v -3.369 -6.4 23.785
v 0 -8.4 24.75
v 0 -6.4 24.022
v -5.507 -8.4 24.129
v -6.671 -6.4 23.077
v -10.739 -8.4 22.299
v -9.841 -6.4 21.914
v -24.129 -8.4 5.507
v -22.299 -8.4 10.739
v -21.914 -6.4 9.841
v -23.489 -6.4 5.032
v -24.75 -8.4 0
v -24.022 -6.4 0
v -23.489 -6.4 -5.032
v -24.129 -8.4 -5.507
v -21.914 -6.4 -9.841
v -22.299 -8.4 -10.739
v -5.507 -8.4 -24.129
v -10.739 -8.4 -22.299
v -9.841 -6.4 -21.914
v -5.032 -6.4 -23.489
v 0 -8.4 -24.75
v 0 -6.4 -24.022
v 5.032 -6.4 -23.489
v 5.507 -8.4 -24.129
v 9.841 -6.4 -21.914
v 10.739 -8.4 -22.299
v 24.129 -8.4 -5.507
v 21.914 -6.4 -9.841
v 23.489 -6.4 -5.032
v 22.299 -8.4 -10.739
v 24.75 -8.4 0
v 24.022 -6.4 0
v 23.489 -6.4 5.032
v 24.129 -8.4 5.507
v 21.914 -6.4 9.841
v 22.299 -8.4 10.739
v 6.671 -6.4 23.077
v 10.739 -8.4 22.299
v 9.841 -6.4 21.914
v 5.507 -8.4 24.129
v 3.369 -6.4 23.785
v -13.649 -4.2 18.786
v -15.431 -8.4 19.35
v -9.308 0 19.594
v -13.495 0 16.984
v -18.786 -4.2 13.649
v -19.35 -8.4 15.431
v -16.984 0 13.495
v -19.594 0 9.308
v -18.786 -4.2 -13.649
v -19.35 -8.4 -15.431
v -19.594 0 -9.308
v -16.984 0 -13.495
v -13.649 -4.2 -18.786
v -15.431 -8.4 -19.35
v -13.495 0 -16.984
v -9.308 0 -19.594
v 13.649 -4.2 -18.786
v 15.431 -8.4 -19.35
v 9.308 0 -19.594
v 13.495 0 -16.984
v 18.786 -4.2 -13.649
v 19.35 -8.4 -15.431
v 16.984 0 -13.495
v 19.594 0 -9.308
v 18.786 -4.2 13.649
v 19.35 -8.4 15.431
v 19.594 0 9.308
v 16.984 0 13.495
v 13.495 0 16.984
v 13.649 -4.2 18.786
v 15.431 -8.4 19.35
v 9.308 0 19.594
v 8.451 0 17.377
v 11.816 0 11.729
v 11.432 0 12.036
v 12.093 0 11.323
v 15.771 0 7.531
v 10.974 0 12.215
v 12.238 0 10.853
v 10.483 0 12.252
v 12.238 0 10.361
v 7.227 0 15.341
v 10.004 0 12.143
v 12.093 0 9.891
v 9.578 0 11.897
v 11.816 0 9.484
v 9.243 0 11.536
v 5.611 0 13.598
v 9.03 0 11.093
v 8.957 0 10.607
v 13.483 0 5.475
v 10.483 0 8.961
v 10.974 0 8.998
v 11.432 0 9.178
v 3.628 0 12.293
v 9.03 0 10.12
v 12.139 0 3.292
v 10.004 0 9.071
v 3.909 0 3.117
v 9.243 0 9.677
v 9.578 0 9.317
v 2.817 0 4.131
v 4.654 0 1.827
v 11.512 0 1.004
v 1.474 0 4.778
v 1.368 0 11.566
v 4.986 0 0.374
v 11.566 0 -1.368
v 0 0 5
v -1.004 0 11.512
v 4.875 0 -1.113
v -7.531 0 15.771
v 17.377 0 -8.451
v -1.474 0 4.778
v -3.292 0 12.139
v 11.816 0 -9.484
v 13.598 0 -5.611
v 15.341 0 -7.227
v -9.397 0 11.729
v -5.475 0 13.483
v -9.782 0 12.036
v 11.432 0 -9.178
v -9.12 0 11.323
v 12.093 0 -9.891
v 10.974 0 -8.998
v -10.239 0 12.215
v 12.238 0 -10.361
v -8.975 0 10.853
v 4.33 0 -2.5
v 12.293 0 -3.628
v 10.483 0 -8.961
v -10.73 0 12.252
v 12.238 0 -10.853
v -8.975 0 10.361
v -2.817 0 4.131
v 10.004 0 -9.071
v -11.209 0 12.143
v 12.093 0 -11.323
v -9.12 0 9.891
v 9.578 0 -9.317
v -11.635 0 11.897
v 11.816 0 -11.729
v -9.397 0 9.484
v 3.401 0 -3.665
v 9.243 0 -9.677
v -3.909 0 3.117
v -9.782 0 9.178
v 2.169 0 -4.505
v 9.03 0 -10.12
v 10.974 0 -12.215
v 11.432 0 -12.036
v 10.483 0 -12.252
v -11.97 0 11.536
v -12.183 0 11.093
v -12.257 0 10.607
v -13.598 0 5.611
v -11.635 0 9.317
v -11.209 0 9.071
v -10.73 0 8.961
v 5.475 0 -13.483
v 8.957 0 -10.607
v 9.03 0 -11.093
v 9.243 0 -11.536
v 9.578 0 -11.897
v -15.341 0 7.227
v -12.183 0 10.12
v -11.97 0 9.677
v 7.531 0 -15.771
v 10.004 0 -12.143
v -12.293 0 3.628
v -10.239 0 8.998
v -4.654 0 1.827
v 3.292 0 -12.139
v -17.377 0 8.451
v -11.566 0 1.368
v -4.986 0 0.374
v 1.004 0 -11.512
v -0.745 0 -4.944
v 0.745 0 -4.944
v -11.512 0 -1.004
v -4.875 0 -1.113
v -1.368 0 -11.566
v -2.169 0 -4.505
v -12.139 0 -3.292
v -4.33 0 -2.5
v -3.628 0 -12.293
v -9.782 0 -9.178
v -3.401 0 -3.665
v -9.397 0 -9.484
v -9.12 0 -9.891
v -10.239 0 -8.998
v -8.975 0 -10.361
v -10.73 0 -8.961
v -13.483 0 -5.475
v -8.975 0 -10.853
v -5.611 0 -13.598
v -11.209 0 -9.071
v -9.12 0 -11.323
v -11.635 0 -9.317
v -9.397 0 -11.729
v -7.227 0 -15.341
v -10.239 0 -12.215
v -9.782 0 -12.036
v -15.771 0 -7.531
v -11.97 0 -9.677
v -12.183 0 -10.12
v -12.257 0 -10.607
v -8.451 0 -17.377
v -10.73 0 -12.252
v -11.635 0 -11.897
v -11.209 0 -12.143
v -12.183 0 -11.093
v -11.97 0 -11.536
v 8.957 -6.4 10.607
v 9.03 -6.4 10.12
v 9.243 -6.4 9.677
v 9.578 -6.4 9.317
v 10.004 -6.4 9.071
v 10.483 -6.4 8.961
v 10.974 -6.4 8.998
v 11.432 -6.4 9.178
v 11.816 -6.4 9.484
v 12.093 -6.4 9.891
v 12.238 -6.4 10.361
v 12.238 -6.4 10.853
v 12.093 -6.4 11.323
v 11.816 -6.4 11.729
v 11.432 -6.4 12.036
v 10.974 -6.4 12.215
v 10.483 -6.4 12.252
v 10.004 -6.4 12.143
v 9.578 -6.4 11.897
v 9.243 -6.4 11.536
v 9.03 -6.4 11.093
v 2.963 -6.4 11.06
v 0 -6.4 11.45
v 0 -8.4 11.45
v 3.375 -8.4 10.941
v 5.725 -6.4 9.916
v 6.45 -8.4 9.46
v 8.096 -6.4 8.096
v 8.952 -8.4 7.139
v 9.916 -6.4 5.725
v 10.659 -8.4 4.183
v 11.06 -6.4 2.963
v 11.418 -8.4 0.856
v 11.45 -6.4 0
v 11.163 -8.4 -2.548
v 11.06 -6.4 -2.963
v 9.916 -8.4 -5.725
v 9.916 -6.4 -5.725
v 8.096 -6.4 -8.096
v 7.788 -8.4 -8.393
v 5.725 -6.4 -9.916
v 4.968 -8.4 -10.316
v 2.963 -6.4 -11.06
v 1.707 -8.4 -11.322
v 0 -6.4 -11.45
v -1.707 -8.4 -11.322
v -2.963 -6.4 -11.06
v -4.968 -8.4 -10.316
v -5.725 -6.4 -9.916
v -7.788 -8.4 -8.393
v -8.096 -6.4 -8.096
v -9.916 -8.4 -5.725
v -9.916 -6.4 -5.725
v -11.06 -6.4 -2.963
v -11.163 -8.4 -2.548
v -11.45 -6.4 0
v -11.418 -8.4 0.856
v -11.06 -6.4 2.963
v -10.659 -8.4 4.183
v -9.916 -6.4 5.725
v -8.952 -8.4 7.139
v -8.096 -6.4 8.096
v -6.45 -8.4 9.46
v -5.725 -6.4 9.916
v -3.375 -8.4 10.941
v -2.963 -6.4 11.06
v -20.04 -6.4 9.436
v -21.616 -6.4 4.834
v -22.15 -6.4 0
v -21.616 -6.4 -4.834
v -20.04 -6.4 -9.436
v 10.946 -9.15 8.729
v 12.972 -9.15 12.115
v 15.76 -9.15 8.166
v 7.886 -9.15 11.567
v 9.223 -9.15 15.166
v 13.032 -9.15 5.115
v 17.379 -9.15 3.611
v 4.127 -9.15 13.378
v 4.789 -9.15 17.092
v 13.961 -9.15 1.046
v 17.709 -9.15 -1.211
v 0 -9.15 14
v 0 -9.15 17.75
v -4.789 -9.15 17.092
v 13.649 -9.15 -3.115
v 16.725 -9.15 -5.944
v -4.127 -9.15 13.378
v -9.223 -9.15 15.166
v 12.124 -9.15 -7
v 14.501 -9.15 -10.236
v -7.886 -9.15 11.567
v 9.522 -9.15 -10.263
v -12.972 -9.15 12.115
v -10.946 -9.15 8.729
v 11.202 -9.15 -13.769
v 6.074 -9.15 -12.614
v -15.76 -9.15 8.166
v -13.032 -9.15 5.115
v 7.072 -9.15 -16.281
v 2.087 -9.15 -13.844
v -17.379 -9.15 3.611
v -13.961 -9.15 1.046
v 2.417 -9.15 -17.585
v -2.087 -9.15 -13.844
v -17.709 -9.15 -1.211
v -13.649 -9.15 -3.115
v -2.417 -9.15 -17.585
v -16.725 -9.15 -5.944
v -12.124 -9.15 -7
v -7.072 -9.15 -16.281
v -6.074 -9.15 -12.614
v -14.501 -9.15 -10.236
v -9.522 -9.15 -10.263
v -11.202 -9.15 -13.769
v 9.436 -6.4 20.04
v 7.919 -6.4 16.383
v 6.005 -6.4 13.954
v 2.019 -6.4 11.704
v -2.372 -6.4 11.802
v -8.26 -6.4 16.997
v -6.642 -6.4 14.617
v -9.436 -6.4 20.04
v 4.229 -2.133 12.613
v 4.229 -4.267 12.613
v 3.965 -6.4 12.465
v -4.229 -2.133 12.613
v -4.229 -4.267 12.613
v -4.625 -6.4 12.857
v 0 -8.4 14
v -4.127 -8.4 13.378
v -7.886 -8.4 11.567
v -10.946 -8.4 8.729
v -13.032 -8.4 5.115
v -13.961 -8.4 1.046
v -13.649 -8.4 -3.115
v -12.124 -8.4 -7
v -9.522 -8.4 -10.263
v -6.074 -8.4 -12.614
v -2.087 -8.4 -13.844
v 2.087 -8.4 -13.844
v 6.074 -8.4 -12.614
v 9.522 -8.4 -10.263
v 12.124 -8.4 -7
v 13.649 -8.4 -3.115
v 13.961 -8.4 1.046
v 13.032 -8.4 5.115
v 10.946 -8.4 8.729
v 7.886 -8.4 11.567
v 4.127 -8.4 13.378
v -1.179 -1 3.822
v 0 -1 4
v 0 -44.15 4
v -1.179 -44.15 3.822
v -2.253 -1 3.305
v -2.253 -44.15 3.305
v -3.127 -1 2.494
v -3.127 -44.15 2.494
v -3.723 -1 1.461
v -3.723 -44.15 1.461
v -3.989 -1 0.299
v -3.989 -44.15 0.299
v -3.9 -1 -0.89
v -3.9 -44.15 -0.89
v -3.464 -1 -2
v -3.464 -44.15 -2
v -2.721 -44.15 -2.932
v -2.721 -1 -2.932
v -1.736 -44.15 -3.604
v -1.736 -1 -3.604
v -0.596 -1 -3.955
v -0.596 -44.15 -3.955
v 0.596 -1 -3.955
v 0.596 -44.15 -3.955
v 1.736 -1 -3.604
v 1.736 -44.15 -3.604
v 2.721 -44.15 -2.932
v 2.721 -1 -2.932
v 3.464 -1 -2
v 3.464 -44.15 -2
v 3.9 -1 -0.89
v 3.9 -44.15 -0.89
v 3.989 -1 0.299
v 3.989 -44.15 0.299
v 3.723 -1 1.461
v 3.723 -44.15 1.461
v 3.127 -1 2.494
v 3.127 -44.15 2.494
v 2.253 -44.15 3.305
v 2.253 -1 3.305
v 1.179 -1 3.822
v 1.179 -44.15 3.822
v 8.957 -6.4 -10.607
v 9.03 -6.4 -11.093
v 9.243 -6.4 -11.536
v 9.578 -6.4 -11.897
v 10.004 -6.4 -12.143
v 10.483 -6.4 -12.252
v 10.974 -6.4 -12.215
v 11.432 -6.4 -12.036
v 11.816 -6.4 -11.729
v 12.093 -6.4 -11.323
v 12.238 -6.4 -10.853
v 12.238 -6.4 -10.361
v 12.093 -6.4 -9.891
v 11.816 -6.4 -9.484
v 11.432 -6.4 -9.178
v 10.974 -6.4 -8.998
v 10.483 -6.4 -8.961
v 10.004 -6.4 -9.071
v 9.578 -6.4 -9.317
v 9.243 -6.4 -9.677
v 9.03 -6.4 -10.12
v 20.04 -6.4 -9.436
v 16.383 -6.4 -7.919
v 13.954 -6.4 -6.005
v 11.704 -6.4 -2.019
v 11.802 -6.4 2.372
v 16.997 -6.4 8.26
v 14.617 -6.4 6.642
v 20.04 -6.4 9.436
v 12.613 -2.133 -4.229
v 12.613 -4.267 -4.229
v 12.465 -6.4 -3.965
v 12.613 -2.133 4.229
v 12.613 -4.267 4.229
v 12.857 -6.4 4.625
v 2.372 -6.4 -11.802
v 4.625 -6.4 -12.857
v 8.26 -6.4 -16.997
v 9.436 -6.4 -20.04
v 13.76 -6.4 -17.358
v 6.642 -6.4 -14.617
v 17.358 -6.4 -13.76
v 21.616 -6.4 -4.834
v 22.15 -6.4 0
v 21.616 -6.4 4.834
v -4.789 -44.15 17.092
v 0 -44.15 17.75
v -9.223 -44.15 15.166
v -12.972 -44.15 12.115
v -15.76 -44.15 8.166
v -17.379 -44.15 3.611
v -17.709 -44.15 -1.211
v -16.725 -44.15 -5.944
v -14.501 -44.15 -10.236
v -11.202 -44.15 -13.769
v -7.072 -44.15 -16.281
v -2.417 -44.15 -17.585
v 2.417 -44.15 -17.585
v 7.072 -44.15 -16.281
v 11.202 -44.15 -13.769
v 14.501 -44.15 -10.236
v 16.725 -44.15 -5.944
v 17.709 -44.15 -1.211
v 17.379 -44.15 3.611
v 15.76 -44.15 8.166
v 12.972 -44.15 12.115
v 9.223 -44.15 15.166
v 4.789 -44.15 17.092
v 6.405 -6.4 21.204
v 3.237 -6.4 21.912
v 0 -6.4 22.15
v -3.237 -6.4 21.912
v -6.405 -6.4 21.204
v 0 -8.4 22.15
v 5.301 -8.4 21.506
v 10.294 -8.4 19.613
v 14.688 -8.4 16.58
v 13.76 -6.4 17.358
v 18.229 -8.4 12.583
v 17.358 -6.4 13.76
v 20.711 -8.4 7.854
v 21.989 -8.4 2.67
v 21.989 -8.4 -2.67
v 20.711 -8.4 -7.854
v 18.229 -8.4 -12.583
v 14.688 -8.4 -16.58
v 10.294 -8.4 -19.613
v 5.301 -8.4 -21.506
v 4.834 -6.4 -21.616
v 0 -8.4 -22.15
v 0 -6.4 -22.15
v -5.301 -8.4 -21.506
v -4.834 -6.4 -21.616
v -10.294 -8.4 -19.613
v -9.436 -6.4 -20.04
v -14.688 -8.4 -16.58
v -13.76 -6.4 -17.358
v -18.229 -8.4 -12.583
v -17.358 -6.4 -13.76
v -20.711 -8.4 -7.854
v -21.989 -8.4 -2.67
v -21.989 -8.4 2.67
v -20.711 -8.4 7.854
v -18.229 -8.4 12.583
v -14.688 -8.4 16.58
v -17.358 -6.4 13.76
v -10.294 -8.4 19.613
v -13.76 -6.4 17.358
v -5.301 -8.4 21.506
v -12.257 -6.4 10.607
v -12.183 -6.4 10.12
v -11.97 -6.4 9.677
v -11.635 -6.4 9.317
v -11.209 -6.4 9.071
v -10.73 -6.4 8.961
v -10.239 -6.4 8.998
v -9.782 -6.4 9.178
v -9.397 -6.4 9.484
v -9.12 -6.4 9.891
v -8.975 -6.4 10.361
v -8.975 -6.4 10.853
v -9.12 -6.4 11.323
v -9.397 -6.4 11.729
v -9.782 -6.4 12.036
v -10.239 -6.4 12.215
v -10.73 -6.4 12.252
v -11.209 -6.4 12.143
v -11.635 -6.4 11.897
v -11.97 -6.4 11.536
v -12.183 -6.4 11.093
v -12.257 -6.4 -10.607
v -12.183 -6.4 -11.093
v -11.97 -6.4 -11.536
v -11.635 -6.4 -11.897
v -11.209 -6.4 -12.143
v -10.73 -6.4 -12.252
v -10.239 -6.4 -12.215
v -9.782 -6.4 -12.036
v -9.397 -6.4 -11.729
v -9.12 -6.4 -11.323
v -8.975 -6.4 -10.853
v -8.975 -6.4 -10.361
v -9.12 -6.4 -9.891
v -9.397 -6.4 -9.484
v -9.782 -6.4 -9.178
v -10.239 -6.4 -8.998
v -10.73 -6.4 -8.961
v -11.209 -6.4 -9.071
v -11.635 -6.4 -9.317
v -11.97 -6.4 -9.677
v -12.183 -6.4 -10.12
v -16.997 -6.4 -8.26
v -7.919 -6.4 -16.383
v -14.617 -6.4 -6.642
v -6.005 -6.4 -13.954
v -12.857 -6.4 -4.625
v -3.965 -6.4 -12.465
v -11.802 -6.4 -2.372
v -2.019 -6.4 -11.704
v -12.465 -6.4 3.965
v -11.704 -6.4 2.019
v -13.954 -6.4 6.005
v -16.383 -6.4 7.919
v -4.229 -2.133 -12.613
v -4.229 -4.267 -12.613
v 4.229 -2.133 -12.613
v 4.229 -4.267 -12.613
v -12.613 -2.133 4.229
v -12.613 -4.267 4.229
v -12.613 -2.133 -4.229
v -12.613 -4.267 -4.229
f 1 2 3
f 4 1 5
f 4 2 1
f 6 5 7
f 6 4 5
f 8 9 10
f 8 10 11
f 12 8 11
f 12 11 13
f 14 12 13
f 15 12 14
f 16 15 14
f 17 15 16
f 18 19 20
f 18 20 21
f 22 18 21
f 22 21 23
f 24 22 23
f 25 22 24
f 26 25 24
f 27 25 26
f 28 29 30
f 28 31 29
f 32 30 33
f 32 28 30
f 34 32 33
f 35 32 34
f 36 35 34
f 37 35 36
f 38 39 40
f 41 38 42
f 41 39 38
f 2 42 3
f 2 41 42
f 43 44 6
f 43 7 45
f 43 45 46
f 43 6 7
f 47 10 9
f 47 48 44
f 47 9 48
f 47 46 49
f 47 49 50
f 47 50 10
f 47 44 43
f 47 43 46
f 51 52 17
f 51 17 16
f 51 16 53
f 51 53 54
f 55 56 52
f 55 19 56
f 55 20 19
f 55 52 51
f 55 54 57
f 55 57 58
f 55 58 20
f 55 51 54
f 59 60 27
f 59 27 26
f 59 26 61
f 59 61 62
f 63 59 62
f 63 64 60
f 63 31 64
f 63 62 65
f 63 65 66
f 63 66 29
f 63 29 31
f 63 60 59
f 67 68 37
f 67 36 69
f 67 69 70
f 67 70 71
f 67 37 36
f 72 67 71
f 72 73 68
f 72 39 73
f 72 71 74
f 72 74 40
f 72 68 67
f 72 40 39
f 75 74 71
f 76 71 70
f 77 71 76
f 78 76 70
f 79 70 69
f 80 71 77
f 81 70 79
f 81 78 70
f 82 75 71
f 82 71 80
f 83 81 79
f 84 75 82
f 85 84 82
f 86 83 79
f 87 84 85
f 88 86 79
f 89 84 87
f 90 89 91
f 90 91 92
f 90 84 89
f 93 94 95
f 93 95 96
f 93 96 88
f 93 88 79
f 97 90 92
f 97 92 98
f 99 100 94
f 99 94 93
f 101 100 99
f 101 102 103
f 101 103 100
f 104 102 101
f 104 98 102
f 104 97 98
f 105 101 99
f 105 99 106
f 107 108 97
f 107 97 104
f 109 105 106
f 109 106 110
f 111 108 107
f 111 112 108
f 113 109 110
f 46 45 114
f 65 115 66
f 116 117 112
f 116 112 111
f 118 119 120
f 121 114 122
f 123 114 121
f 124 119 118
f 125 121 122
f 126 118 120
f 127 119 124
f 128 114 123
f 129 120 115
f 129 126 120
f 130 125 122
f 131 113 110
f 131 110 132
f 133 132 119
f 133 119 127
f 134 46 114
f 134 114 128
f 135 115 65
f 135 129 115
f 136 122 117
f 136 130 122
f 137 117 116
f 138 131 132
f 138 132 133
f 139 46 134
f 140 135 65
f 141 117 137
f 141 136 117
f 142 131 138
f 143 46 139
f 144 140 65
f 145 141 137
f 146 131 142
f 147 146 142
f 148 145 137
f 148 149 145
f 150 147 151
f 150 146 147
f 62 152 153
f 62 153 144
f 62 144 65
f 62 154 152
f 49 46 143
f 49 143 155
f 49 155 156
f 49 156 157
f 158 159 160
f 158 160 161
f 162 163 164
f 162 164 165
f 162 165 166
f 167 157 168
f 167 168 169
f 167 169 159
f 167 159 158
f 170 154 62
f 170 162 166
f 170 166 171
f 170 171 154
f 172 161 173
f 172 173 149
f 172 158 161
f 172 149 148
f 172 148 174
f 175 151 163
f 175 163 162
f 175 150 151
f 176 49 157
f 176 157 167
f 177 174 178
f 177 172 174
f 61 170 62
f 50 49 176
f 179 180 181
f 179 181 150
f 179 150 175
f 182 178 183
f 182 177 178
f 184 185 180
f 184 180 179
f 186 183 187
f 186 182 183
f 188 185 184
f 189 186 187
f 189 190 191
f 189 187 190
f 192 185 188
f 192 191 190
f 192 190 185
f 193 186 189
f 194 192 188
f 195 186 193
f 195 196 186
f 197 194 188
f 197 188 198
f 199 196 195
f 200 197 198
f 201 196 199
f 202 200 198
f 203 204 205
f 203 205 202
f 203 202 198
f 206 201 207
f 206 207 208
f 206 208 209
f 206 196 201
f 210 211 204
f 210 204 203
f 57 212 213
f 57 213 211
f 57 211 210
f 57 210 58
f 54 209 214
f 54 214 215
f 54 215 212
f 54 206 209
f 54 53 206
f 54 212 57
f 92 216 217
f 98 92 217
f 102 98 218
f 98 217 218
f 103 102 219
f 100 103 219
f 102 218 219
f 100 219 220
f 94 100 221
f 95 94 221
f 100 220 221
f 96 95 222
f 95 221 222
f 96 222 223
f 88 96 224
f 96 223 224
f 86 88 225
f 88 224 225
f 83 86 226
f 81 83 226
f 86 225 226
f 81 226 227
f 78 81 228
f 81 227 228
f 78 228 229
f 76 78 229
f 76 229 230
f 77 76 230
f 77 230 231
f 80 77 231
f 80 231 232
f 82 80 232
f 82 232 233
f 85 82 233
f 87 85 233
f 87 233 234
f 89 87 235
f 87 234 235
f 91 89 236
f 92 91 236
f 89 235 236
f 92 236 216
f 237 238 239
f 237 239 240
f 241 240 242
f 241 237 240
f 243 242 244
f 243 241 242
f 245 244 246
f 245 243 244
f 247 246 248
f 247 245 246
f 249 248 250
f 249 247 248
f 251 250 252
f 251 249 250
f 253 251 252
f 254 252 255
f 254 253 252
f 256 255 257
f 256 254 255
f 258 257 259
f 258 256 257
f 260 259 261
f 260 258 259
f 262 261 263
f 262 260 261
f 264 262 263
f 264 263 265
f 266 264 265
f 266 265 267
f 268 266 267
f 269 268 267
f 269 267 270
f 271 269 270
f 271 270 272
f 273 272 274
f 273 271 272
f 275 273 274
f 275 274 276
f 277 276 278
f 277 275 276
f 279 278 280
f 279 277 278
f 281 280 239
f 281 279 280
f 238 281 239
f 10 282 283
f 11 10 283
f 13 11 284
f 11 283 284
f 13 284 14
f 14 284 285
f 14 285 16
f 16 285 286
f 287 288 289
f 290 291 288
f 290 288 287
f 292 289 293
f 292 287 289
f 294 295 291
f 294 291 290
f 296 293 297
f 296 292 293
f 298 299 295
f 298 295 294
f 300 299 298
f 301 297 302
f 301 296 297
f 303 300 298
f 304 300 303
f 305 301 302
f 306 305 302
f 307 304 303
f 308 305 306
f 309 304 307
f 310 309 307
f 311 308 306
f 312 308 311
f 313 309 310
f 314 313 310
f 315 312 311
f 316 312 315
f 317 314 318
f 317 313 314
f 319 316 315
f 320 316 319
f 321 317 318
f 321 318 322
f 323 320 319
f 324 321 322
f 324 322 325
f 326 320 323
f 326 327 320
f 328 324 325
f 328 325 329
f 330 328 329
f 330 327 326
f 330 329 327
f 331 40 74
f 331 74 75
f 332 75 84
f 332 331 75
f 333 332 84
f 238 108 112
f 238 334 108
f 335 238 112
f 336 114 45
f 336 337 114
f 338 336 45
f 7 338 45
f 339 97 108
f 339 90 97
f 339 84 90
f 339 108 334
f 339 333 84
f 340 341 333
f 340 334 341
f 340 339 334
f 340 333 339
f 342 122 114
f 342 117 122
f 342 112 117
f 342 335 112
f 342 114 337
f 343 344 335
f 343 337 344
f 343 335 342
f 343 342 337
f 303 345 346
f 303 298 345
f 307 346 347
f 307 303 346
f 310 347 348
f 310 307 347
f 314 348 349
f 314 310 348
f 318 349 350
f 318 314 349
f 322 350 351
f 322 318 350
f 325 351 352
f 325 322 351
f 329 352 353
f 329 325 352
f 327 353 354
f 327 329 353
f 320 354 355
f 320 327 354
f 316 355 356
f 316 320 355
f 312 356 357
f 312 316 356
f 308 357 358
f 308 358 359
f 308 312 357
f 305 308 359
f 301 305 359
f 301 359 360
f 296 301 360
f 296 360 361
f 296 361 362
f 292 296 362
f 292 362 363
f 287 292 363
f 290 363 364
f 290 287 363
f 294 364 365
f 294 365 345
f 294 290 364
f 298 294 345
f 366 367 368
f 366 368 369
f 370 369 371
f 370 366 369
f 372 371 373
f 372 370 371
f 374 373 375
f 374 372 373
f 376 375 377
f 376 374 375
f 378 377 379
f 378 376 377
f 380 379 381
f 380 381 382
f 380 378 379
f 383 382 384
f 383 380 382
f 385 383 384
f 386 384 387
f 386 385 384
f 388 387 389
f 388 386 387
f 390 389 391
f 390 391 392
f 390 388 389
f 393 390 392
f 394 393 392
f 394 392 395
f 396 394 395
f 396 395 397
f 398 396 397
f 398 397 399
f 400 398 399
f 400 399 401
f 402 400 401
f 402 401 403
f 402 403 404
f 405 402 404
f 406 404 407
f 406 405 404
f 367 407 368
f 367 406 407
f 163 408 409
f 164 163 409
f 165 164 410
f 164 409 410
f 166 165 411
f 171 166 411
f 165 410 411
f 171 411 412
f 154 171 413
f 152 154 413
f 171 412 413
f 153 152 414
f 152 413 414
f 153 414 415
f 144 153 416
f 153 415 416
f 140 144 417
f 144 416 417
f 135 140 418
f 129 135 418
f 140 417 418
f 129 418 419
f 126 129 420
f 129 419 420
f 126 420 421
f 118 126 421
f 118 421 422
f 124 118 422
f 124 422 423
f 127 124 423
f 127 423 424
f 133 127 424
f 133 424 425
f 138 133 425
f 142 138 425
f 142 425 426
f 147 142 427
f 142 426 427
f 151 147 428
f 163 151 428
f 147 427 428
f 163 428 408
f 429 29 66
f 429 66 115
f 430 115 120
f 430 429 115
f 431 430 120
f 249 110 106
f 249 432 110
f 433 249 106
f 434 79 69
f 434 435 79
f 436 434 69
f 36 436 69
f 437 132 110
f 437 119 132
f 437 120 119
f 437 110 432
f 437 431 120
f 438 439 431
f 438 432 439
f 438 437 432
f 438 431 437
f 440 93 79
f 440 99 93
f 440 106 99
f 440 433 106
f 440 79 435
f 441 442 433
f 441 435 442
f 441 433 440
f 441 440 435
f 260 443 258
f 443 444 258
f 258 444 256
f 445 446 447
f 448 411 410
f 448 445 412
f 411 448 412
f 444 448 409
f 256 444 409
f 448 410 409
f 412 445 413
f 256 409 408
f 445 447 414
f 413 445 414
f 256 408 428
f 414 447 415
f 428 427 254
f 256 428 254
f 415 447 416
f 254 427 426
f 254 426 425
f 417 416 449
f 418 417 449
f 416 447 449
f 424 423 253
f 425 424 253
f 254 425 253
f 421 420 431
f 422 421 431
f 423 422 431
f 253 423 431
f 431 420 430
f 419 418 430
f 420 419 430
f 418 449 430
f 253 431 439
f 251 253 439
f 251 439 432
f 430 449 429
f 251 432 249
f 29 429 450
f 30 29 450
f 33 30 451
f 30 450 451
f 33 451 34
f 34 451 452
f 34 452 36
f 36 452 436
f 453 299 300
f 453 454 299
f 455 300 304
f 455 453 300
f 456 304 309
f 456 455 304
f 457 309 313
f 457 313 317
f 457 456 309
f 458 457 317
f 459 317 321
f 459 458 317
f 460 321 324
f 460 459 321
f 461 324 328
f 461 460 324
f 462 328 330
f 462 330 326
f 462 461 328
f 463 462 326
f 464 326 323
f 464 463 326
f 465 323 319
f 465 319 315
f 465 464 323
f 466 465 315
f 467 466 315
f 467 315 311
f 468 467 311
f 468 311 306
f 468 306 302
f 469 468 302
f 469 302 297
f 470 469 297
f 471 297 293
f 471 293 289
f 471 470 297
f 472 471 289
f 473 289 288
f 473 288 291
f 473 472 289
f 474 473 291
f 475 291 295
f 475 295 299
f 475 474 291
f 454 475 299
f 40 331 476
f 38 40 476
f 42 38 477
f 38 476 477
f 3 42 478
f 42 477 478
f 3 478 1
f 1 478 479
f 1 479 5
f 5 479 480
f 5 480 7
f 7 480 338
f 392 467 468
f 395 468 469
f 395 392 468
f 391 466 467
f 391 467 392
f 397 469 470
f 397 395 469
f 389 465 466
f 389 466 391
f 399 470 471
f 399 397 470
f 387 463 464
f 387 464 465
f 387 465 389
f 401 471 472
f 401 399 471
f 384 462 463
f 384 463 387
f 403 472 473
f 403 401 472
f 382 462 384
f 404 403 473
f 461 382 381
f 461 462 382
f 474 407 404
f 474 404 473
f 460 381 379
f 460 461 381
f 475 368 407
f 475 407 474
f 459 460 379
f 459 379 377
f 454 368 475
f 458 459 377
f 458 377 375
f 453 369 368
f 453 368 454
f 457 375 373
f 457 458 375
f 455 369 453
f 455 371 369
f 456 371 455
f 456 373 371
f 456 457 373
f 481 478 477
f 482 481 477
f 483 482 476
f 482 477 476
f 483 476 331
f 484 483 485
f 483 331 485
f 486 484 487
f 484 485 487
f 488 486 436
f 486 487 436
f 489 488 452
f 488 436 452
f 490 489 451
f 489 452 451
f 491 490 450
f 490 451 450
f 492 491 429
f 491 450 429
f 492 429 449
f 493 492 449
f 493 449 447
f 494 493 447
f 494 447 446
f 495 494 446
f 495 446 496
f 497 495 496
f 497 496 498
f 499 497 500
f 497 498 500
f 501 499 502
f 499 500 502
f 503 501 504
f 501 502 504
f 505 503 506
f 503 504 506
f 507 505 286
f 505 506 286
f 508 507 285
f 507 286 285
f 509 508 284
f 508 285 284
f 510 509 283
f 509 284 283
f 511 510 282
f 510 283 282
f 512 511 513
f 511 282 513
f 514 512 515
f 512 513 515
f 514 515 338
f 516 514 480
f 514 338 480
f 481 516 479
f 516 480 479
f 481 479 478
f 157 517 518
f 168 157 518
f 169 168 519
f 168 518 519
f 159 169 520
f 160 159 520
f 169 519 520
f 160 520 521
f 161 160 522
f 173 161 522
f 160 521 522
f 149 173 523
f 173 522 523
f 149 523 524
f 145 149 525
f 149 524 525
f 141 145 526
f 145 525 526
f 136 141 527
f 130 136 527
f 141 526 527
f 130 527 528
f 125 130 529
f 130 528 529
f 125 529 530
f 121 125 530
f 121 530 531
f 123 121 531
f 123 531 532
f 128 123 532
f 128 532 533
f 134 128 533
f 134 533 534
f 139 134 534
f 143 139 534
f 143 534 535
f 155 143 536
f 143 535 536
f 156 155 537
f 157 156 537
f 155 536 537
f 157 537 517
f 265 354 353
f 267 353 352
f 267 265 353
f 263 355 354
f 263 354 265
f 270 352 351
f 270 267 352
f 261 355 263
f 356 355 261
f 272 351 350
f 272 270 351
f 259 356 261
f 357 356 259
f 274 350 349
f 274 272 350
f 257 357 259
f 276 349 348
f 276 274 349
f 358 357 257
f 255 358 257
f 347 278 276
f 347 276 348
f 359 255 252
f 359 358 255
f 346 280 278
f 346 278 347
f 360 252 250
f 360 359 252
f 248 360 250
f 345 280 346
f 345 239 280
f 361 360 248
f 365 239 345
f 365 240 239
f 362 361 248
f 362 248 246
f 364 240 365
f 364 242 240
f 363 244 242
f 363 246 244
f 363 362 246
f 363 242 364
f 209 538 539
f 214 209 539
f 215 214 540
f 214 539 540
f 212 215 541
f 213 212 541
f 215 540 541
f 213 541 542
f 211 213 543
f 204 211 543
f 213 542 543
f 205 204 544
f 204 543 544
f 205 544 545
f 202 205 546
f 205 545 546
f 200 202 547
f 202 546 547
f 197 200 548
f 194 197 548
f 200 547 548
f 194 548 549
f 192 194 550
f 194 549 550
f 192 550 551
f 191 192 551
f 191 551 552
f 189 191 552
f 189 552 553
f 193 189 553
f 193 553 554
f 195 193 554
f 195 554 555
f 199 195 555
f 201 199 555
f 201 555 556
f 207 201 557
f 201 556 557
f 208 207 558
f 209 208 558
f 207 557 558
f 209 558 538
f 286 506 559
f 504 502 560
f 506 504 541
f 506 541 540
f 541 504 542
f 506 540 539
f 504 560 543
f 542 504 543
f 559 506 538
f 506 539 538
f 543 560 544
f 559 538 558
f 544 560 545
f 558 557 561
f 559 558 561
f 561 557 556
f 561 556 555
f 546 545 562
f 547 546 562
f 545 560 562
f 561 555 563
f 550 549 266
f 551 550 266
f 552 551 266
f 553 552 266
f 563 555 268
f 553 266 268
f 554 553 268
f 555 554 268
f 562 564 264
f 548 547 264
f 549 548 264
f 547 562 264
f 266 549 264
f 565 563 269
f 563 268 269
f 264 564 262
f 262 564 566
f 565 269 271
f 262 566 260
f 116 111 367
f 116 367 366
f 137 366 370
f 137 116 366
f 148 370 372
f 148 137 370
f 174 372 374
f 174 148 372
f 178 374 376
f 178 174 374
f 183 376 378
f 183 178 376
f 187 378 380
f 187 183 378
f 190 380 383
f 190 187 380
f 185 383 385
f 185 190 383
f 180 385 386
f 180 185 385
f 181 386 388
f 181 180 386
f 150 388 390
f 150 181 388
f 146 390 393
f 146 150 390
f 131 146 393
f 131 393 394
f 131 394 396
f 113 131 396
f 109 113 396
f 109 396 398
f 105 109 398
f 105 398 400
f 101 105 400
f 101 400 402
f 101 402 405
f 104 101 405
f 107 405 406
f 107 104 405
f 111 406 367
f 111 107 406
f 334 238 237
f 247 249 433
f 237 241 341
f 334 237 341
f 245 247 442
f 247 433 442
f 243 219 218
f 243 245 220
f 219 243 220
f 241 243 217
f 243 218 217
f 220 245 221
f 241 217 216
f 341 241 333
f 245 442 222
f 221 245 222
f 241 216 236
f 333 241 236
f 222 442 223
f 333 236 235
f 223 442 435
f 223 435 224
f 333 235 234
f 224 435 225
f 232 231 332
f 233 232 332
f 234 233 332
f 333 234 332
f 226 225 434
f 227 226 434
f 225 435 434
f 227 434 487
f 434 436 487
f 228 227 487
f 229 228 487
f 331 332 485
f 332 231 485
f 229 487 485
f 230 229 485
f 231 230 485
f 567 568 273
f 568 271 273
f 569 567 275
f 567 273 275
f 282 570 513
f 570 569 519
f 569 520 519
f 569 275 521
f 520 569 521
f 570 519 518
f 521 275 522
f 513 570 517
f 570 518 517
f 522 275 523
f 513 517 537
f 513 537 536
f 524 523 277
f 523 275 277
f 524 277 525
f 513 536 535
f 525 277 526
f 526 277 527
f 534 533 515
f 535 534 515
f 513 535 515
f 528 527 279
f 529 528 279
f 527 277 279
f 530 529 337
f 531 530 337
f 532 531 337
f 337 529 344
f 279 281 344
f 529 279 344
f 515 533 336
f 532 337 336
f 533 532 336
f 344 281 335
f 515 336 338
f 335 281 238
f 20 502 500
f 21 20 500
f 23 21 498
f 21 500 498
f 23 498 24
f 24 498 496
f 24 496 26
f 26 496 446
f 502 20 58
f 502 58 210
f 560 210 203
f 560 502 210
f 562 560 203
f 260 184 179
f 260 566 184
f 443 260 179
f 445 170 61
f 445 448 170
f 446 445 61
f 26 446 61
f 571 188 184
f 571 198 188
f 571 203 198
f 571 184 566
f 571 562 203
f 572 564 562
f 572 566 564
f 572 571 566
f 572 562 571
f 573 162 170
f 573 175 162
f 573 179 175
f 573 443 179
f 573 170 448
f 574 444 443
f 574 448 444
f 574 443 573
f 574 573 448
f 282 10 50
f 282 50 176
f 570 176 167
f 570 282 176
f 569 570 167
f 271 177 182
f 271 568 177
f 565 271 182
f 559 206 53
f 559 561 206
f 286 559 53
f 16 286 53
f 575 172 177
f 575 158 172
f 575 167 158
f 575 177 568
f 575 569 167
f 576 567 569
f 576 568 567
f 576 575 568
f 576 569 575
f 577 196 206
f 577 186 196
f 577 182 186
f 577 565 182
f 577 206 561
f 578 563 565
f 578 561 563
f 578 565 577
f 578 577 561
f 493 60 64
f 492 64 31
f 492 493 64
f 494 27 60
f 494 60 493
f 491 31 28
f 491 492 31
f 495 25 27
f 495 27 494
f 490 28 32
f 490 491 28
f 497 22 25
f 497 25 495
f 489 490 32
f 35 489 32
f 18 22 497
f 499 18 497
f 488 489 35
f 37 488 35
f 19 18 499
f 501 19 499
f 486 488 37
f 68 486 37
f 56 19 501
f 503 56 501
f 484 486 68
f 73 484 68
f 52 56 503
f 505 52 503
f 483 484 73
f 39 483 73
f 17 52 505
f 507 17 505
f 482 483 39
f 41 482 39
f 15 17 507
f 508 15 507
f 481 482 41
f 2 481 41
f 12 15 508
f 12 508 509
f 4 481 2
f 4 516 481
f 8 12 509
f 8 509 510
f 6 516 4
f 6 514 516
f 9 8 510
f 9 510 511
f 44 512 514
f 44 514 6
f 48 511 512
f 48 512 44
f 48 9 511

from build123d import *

# Parameters (mm, degrees)
TAP_DRILL_FOR_M4X0_7_TAP1_D     = 3.3
TAP_DRILL_FOR_M4X0_7_TAP1_DEPTH = 8
TAP_DRILL_FOR_M4X0_7_TAP1_TIP   = 0.991420021
CHAMFER1_SIZE                   = 1
CUT_EXTRUDE3_DEPTH              = 52.479971834
CIRPATTERN2_COUNT               = 4
SKETCH9_R                       = 22.15
SKETCH9_R_2                     = 11.45
CUT_EXTRUDE5_DEPTH              = 2


with BuildPart() as part:
    # Sketch2 → Revolve1 (revolve)
    with BuildSketch(Plane.XY, mode=Mode.PRIVATE) as revolve1_sk:
        Polygon((4, -44.15), (4, 0), (21.692650032, 0), (24.75, -8.4), (14, -8.4), (14, -9.15), (17.75, -9.15), (17.75, -44.15), align=None)
    revolve(revolve1_sk.sketch.rotate(Axis((0, 46.5537, 0), (0, -1, 0)), 90), axis=Axis((0, 46.5537, 0), (0, -1, 0)))

    # Tap Drill for M4x0.7 Tap1
    with Locations(Plane(origin=(0, 0, 0), x_dir=(1, 0, 0), z_dir=(0, 1, 0))):
        with Locations((10.606601718, -10.606601718), (-10.606601718, -10.606601718), (-10.606601718, 10.606601718), (10.606601718, 10.606601718)):
            Hole(TAP_DRILL_FOR_M4X0_7_TAP1_D / 2, depth=TAP_DRILL_FOR_M4X0_7_TAP1_DEPTH)
            with Locations((0, 0, -(TAP_DRILL_FOR_M4X0_7_TAP1_DEPTH + TAP_DRILL_FOR_M4X0_7_TAP1_TIP / 2))):  # 118° drill point
                Cone(0, TAP_DRILL_FOR_M4X0_7_TAP1_D / 2, TAP_DRILL_FOR_M4X0_7_TAP1_TIP, mode=Mode.SUBTRACT)

    # Chamfer1
    chamfer1_edges = [part.edges().sort_by_distance(p)[0] for p in [
        (0, 0, -4),
    ]]
    chamfer(chamfer1_edges, length=CHAMFER1_SIZE)

    # Sketch8 → Cut-Extrude3 (cut, through all)
    with BuildSketch(Plane(origin=(0, -6.4, 0), x_dir=(-1, 0, 0), z_dir=(0, -1, 0))):
        with BuildLine():
            ThreePointArc((-9.95, -22.661862236), (0, -24.75), (9.95, -22.661862236))
            add(Edge.make_bspline(
                [(-9.95, -22.661862236), (-8.05, -7.712712588), (8.05, -7.712712588), (9.95, -22.661862236)],
                knots=[0, 0, 0, 0, 1, 1, 1, 1], degree=3))
        make_face()
    cut_extrude3 = extrude(amount=-CUT_EXTRUDE3_DEPTH, mode=Mode.SUBTRACT)

    # CirPattern2: Cut-Extrude3 ×4 about axis
    cirpattern2_axis = Axis((0, 46.5537, 0), (0, -1, 0))
    for i in range(1, CIRPATTERN2_COUNT):
        add(cut_extrude3.rotate(cirpattern2_axis, i * 360 / CIRPATTERN2_COUNT), mode=Mode.SUBTRACT)

    # Sketch9 → Cut-Extrude5 (cut)
    with BuildSketch(Plane(origin=(0, -6.4, 0), x_dir=(1, 0, 0), z_dir=(0, 1, 0))):
        with Locations(Location((0, 0, 0), (0, 0, 270))):
            Circle(SKETCH9_R)
        with Locations(Location((0, 0, 0), (0, 0, 270))):
            Circle(SKETCH9_R_2, mode=Mode.SUBTRACT)
    extrude(amount=-CUT_EXTRUDE5_DEPTH, mode=Mode.SUBTRACT)


solid = part.part
